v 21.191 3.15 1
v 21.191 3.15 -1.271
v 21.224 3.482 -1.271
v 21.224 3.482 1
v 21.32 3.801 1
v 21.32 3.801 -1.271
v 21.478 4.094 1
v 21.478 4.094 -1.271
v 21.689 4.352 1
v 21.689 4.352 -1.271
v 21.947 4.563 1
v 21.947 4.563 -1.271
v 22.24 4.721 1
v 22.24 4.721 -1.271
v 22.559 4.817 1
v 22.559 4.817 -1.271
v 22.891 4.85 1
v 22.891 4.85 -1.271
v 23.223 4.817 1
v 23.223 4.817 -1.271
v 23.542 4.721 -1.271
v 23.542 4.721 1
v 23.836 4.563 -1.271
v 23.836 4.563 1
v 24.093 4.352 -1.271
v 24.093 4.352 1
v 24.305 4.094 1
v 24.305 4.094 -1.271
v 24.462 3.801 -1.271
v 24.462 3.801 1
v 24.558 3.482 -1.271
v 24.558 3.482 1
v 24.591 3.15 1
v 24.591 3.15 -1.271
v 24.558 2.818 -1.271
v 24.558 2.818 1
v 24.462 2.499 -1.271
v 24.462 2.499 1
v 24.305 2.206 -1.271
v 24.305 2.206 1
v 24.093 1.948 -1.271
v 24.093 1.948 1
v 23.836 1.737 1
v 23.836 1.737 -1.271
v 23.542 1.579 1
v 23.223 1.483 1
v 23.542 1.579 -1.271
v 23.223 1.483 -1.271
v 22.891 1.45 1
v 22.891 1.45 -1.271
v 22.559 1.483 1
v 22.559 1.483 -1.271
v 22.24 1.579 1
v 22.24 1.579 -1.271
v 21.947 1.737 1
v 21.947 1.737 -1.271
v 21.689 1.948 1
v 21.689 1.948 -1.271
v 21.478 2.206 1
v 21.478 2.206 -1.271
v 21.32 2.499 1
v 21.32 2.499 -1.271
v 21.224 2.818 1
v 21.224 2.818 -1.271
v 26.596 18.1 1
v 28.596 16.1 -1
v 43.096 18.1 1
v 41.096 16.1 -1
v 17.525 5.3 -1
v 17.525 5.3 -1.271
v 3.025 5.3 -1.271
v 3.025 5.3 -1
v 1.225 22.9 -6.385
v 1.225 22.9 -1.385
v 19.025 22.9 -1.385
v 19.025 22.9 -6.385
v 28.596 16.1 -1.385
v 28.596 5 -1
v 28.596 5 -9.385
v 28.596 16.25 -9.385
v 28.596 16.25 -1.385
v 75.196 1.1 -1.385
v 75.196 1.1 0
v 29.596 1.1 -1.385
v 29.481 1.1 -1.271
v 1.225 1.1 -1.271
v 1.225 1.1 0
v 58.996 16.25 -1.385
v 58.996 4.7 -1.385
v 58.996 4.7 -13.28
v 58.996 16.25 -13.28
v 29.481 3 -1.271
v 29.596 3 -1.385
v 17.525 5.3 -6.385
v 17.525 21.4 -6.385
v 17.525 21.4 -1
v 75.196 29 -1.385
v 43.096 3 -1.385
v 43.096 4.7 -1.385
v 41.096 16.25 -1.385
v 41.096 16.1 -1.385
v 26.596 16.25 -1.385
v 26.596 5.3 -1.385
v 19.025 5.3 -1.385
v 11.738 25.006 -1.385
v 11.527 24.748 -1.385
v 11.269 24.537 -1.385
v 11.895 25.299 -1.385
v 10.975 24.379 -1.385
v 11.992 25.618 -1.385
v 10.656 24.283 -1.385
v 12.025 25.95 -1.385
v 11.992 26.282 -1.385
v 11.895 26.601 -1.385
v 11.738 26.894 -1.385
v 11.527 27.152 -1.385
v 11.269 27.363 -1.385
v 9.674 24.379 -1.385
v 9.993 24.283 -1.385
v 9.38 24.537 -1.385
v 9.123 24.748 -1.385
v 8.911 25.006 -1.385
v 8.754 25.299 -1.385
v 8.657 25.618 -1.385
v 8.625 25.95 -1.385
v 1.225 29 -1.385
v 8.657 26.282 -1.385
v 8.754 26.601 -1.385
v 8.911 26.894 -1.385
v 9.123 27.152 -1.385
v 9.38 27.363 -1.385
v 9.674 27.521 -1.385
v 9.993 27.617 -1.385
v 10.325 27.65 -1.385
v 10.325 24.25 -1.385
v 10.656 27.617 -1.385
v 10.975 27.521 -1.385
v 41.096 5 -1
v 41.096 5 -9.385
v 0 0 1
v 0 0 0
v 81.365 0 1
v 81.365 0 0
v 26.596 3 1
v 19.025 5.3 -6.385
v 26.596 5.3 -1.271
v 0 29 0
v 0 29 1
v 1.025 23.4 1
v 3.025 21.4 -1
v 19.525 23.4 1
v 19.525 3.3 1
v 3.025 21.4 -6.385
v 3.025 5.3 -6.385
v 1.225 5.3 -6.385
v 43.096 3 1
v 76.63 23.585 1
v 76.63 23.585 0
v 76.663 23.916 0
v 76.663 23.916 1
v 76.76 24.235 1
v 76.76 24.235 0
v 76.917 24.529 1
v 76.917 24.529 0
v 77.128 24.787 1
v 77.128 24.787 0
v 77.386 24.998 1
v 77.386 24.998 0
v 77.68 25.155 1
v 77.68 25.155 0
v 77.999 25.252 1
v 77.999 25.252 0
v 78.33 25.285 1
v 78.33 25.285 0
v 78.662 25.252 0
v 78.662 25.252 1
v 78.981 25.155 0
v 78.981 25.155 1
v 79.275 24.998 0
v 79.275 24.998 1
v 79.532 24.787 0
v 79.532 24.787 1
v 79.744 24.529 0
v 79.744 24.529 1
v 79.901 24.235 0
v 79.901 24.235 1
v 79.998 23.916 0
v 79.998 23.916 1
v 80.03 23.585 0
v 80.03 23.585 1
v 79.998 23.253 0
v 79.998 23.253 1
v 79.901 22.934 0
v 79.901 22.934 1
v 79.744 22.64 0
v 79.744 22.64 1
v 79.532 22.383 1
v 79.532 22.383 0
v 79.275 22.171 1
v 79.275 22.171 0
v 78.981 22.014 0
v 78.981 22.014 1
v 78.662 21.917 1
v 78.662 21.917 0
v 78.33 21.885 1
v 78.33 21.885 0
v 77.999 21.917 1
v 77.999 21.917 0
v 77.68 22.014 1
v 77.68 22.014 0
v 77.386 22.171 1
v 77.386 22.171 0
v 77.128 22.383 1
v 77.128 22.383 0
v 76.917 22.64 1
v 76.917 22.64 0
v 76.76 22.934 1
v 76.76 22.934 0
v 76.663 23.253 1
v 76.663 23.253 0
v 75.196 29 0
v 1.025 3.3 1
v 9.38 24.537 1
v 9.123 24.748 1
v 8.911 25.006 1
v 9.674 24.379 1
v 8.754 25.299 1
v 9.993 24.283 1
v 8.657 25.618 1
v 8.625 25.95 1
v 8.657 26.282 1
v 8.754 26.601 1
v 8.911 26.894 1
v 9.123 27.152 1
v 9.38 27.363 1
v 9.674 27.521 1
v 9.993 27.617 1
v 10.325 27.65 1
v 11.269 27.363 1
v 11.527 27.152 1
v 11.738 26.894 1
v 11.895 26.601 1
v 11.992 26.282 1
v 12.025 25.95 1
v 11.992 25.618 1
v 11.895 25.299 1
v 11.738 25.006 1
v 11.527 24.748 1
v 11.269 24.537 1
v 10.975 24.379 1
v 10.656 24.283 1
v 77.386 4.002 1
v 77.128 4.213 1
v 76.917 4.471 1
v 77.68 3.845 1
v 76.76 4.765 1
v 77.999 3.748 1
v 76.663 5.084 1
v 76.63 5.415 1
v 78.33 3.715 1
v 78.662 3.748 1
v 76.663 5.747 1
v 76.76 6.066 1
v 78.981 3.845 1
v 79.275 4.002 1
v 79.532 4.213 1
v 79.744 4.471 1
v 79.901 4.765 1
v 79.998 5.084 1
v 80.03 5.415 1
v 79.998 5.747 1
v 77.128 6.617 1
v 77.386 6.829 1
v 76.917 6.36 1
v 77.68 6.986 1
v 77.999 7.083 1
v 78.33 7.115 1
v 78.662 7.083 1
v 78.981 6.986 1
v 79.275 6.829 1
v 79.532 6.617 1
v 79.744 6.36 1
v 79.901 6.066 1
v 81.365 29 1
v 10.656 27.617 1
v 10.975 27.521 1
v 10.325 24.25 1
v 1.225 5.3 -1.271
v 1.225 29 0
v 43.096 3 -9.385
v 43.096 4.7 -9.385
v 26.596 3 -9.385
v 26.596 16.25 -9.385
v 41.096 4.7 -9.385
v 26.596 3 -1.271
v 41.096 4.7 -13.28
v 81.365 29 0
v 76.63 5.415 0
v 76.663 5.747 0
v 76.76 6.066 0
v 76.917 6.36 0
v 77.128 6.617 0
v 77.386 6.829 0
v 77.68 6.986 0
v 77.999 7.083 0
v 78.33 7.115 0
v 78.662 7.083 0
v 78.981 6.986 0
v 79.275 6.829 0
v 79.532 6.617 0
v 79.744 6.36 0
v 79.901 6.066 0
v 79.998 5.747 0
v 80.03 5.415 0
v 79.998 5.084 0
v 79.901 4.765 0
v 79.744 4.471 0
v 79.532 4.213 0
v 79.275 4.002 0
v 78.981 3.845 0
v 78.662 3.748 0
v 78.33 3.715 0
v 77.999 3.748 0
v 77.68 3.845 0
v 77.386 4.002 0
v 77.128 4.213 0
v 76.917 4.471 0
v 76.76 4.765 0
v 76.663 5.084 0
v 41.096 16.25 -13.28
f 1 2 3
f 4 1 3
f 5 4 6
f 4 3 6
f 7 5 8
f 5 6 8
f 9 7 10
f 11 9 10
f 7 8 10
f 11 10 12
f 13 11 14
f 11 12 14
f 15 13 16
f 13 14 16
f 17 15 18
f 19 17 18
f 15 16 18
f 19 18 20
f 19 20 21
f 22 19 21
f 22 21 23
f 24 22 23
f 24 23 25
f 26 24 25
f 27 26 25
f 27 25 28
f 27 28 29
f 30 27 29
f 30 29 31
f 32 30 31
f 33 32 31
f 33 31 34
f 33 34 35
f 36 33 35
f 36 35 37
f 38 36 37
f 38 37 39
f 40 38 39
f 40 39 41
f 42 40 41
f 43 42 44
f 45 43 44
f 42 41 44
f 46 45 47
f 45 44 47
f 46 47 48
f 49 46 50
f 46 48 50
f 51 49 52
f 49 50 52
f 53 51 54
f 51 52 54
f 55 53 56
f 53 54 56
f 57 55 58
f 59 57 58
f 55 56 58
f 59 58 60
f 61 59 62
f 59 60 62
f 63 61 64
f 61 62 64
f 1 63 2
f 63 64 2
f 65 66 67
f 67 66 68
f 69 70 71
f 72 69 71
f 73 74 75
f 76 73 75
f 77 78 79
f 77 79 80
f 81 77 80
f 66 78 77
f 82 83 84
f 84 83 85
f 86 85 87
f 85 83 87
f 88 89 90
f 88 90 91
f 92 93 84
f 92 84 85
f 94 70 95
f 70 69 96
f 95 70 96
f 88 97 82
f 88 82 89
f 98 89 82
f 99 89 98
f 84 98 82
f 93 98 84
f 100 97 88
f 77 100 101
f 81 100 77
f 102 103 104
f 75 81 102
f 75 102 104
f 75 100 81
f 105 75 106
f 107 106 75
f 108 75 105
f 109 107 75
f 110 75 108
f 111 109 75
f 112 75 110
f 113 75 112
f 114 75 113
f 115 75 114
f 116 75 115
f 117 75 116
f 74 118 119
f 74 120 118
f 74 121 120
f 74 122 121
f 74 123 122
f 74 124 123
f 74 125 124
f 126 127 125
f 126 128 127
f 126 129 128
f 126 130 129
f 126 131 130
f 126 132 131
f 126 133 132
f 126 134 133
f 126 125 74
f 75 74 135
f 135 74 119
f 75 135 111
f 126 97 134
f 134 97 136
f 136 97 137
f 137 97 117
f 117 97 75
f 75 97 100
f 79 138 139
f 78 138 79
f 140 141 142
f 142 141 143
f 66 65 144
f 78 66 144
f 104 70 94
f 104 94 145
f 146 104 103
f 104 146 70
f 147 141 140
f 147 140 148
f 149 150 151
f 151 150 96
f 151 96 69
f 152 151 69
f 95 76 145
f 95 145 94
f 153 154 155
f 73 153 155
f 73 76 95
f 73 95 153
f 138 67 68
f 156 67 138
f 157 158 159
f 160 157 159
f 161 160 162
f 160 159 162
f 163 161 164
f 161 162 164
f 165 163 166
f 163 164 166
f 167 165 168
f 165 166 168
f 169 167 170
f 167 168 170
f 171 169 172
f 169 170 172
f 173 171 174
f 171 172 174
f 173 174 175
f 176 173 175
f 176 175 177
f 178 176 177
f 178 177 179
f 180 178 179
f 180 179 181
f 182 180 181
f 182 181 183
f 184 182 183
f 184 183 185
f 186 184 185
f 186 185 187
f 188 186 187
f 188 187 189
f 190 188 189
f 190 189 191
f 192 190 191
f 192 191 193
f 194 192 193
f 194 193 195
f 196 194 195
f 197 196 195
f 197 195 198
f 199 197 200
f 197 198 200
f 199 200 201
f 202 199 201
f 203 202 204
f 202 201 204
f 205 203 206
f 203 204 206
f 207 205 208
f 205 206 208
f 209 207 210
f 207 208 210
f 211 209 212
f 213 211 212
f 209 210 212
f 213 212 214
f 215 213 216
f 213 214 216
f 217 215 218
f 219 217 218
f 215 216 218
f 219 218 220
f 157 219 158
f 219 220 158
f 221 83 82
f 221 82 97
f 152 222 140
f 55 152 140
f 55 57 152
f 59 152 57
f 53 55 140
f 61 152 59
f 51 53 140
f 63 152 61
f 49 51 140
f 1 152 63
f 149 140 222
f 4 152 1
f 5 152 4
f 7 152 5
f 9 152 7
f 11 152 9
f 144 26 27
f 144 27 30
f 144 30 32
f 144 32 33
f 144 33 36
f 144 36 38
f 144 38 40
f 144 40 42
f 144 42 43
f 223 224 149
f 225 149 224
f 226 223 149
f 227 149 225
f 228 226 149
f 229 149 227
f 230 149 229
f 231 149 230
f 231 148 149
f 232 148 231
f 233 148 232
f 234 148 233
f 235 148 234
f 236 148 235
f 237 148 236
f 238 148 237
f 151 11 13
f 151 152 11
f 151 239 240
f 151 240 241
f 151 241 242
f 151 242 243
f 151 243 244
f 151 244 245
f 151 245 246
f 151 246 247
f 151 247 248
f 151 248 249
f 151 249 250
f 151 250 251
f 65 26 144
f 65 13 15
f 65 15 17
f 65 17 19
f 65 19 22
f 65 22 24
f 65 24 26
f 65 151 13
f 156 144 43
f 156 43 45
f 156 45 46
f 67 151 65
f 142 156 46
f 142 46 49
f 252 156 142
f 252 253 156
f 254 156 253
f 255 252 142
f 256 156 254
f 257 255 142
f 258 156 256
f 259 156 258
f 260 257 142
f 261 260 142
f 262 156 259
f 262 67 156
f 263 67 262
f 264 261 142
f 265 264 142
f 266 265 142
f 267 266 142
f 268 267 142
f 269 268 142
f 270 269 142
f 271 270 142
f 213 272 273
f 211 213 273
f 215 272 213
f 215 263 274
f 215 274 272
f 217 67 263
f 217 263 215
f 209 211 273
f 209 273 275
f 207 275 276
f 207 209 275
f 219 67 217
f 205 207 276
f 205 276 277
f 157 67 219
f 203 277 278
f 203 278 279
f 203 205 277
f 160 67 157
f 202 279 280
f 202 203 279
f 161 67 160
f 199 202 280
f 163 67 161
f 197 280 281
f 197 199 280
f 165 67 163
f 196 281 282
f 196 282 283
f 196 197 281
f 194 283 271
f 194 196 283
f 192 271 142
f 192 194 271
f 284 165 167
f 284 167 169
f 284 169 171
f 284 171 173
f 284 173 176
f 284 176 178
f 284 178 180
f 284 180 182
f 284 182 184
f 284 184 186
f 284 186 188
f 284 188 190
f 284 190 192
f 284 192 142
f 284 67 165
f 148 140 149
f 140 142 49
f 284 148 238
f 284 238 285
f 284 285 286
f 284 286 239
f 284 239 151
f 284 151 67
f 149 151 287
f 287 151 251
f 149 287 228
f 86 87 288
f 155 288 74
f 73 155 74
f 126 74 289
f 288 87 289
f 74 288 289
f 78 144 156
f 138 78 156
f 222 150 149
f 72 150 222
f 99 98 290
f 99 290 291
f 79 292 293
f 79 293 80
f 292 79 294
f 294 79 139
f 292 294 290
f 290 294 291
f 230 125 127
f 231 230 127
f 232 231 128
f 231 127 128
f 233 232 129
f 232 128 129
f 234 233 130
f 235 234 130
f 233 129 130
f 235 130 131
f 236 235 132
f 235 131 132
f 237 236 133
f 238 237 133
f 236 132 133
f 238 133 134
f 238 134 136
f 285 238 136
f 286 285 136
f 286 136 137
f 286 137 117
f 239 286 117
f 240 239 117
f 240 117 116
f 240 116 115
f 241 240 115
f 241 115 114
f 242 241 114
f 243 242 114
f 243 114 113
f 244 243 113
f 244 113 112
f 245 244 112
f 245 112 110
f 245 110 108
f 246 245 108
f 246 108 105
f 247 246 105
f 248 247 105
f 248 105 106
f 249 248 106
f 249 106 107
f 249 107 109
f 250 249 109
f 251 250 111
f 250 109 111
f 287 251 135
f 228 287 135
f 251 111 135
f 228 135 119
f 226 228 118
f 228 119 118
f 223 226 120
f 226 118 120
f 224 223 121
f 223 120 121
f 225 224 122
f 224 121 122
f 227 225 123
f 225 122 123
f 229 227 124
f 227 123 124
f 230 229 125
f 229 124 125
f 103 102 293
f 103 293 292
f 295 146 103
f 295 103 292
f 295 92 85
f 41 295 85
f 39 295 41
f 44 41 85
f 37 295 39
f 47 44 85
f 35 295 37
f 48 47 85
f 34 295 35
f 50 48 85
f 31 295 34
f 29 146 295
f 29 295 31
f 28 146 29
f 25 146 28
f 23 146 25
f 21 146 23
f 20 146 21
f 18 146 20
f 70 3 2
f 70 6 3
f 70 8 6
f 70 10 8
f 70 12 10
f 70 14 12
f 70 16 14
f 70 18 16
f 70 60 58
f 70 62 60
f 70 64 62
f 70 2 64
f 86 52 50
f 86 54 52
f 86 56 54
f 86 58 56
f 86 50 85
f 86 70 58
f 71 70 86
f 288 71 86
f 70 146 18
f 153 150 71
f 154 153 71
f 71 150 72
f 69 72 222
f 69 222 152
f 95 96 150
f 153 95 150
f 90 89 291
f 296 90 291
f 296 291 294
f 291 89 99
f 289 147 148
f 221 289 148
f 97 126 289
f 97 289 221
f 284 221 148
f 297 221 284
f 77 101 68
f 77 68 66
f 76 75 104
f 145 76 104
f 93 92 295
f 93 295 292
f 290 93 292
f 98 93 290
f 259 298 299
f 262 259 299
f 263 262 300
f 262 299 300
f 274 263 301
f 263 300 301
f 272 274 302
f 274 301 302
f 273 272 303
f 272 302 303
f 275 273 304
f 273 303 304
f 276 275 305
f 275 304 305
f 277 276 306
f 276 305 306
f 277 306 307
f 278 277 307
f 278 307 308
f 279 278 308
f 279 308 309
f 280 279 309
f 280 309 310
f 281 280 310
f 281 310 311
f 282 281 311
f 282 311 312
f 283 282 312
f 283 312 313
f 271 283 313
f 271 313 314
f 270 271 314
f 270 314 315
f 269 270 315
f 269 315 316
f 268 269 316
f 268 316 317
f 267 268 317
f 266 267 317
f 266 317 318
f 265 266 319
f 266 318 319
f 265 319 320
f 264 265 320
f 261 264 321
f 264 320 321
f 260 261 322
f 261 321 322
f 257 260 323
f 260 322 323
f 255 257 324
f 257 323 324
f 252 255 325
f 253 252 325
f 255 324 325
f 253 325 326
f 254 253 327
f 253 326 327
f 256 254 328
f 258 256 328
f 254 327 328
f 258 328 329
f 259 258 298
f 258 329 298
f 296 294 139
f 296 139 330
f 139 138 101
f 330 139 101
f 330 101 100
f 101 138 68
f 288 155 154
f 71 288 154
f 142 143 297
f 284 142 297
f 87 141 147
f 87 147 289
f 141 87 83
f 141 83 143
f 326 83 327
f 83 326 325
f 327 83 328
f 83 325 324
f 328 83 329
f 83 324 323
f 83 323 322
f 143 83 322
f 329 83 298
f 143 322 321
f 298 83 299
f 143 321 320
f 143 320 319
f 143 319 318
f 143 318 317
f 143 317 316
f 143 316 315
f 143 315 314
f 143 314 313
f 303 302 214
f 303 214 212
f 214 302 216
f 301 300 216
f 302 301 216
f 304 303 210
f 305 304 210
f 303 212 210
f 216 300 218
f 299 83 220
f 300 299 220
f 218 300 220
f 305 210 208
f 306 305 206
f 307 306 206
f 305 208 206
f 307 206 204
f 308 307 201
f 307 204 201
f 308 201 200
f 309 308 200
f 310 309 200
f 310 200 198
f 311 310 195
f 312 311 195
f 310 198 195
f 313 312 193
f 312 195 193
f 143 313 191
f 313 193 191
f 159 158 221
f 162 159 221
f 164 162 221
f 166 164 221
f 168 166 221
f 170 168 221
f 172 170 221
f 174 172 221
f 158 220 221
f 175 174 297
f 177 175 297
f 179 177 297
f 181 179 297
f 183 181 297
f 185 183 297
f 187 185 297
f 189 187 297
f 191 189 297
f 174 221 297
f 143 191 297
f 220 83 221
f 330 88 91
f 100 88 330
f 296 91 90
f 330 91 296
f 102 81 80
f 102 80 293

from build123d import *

# Parameters (mm, degrees)
SKIZZE1_W                       = 81.364988045
SKIZZE1_H                       = 29
AUFSATZ_LINEAR_AUSTRAGEN1_DEPTH = 1
SKIZZE2_W                       = 73.970901255
SKIZZE2_H                       = 27.9
AUFSATZ_LINEAR_AUSTRAGEN2_DEPTH = 1.385451
SKIZZE3_W                       = 17.9
SKIZZE3_H                       = 11.549624398
AUFSATZ_LINEAR_AUSTRAGEN3_DEPTH = 11.894549
SKIZZE4_W                       = 14.5
SKIZZE4_H                       = 16.1
SCHNITT_LINEAR_AUSTRAGEN1_DEPTH = 8
AUFSATZ_LINEAR_AUSTRAGEN4_DEPTH = 5
SKIZZE6_W                       = 12.5
SKIZZE6_H                       = 11.1
SCHNITT_LINEAR_AUSTRAGEN2_DEPTH = 88.193701467
AUFSATZ_LINEAR_AUSTRAGEN5_DEPTH = 8
FASE2_SIZE                      = 2
SKIZZE8_R                       = 1.7
SCHNITT_LINEAR_AUSTRAGEN3_DEPTH = 12
SCHNITT_LINEAR_AUSTRAGEN5_DEPTH = 0.114549
SKIZZE11_R                      = 1.7
SCHNITT_LINEAR_AUSTRAGEN6_DEPTH = 12
FASE3_SIZE                      = 3
SKIZZE12_R                      = 1.7
SCHNITT_LINEAR_AUSTRAGEN7_DEPTH = 88.193701467


with BuildPart() as part:
    # Skizze1 → Aufsatz-Linear austragen1 (new body)
    with BuildSketch(Plane.XY):
        with Locations((40.682494023, 14.5)):
            Rectangle(SKIZZE1_W, SKIZZE1_H)
    extrude(amount=AUFSATZ_LINEAR_AUSTRAGEN1_DEPTH)

    # Skizze2 → Aufsatz-Linear austragen2 (add)
    with BuildSketch(Plane(origin=(0, 0, 0), x_dir=(-1, 0, 0), z_dir=(0, 0, -1))):
        with Locations((-38.210114258, 15.05)):
            Rectangle(SKIZZE2_W, SKIZZE2_H)
    extrude(amount=AUFSATZ_LINEAR_AUSTRAGEN2_DEPTH)

    # Skizze3 → Aufsatz-Linear austragen3 (add)
    with BuildSketch(Plane(origin=(0, 0, -1.385450769), x_dir=(-1, 0, 0), z_dir=(0, 0, -1))):
        with Locations((-50.045564885, 10.474812199)):
            Rectangle(SKIZZE3_W, SKIZZE3_H)
    extrude(amount=AUFSATZ_LINEAR_AUSTRAGEN3_DEPTH)

    # Skizze4 → Schnitt-Linear austragen1 (cut)
    with BuildSketch(Plane(origin=(0, 0, -1.385450769), x_dir=(-1, 0, 0), z_dir=(0, 0, -1))):
        with Locations((-10.27466363, 13.35)):
            Rectangle(SKIZZE4_W, SKIZZE4_H)
    extrude(amount=-SCHNITT_LINEAR_AUSTRAGEN1_DEPTH, mode=Mode.SUBTRACT)

    # Skizze5 → Aufsatz-Linear austragen4 (add)
    with BuildSketch(Plane(origin=(0, 0, -1.385450769), x_dir=(-1, 0, 0), z_dir=(0, 0, -1))):
        Polygon((-19.02466363, 22.9), (-19.02466363, 5.3), (-17.52466363, 5.3), (-17.52466363, 21.4), (-3.02466363, 21.4), (-3.02466363, 5.3), (-1.22466363, 5.3), (-1.22466363, 22.9), align=None)
    extrude(amount=AUFSATZ_LINEAR_AUSTRAGEN4_DEPTH)

    # Skizze6 → Schnitt-Linear austragen2 (cut, through all)
    with BuildSketch(Plane(origin=(0, 0, -1.385450769), x_dir=(-1, 0, 0), z_dir=(0, 0, -1))):
        with Locations((-34.845564885, 10.55)):
            Rectangle(SKIZZE6_W, SKIZZE6_H)
    extrude(amount=-SCHNITT_LINEAR_AUSTRAGEN2_DEPTH, mode=Mode.SUBTRACT)

    # Skizze7 → Aufsatz-Linear austragen5 (add)
    with BuildSketch(Plane(origin=(0, 0, -1.385450769), x_dir=(-1, 0, 0), z_dir=(0, 0, -1))):
        Polygon((-28.595564885, 5), (-28.595564885, 16.249624398), (-26.595564885, 16.249624398), (-26.595564885, 3), (-43.095564885, 3), (-43.095564885, 16.249624398), (-41.095564885, 16.249624398), (-41.095564885, 5), align=None)
    extrude(amount=AUFSATZ_LINEAR_AUSTRAGEN5_DEPTH)

    # Fase2
    fase2_edges = [part.edges().sort_by_distance(p)[0] for p in [
        (10.27466363, 5.3, 1),
        (3.02466363, 13.35, 1),
        (10.27466363, 21.4, 1),
        (17.52466363, 13.35, 1),
        (28.595564885, 10.55, 1),
        (34.845564885, 5, 1),
        (41.095564885, 10.55, 1),
        (34.845564885, 16.1, 1),
    ]]
    chamfer(fase2_edges, length=FASE2_SIZE)

    # Skizze8 → Schnitt-Linear austragen3 (cut)
    with BuildSketch(Plane(origin=(0, 0, 0), x_dir=(-1, 0, 0), z_dir=(0, 0, -1))):
        with Locations((-78.330276465, 23.584796683)):
            Circle(SKIZZE8_R)
        with Locations((-78.330276465, 5.415203317)):
            Circle(SKIZZE8_R)
    extrude(amount=-SCHNITT_LINEAR_AUSTRAGEN3_DEPTH, mode=Mode.SUBTRACT)

    # Skizze10 → Schnitt-Linear austragen5 (cut)
    with BuildSketch(Plane(origin=(0, 0, -1.385450769), x_dir=(-1, 0, 0), z_dir=(0, 0, -1))):
        Polygon((-1.12466363, 5.3), (-26.595564885, 5.3), (-26.595564885, 1.1), (-1.22466363, 1.1), align=None)
    extrude(amount=-SCHNITT_LINEAR_AUSTRAGEN5_DEPTH, mode=Mode.SUBTRACT)

    # Skizze11 → Schnitt-Linear austragen6 (cut)
    with BuildSketch(Plane(origin=(0, 0, -1.270901539), x_dir=(-1, 0, 0), z_dir=(0, 0, -1))):
        with Locations((-22.891035352, 3.15)):
            Circle(SKIZZE11_R)
    extrude(amount=-SCHNITT_LINEAR_AUSTRAGEN6_DEPTH, mode=Mode.SUBTRACT)

    # Fase3
    # the kernel refuses this chamfer: 3 mm, written as the material it takes off along each edge
    with BuildSketch(Plane(origin=(26.595564885, 3, -1.385450769), x_dir=(0.9996219148284762, 0, -0.02749595233212696), z_dir=(0, -1, 0))) as fase3_piece_1_section:
        Polygon((FASE3_SIZE * 0.999621916941, FASE3_SIZE * 0.027495875526), (-FASE3_SIZE * 0.0274959523321, FASE3_SIZE * 0.999621914828), (0, 0), align=None)
    fase3_piece_1 = extrude(amount=9.615048972, mode=Mode.PRIVATE)
    fase3_piece_1 = split(fase3_piece_1, bisect_by=Plane(origin=(29.23101577, 2.05, -1.270901769), z_dir=(0, 0, -1)), keep=Keep.TOP, mode=Mode.PRIVATE)
    add(fase3_piece_1, mode=Mode.SUBTRACT)

    # Skizze12 → Schnitt-Linear austragen7 (cut, through all)
    with BuildSketch(Plane(origin=(0, 0, -1.385450769), x_dir=(-1, 0, 0), z_dir=(0, 0, -1))):
        with Locations((-10.32466363, 25.95)):
            Circle(SKIZZE12_R)
    extrude(amount=-SCHNITT_LINEAR_AUSTRAGEN7_DEPTH, mode=Mode.SUBTRACT)


solid = part.part
